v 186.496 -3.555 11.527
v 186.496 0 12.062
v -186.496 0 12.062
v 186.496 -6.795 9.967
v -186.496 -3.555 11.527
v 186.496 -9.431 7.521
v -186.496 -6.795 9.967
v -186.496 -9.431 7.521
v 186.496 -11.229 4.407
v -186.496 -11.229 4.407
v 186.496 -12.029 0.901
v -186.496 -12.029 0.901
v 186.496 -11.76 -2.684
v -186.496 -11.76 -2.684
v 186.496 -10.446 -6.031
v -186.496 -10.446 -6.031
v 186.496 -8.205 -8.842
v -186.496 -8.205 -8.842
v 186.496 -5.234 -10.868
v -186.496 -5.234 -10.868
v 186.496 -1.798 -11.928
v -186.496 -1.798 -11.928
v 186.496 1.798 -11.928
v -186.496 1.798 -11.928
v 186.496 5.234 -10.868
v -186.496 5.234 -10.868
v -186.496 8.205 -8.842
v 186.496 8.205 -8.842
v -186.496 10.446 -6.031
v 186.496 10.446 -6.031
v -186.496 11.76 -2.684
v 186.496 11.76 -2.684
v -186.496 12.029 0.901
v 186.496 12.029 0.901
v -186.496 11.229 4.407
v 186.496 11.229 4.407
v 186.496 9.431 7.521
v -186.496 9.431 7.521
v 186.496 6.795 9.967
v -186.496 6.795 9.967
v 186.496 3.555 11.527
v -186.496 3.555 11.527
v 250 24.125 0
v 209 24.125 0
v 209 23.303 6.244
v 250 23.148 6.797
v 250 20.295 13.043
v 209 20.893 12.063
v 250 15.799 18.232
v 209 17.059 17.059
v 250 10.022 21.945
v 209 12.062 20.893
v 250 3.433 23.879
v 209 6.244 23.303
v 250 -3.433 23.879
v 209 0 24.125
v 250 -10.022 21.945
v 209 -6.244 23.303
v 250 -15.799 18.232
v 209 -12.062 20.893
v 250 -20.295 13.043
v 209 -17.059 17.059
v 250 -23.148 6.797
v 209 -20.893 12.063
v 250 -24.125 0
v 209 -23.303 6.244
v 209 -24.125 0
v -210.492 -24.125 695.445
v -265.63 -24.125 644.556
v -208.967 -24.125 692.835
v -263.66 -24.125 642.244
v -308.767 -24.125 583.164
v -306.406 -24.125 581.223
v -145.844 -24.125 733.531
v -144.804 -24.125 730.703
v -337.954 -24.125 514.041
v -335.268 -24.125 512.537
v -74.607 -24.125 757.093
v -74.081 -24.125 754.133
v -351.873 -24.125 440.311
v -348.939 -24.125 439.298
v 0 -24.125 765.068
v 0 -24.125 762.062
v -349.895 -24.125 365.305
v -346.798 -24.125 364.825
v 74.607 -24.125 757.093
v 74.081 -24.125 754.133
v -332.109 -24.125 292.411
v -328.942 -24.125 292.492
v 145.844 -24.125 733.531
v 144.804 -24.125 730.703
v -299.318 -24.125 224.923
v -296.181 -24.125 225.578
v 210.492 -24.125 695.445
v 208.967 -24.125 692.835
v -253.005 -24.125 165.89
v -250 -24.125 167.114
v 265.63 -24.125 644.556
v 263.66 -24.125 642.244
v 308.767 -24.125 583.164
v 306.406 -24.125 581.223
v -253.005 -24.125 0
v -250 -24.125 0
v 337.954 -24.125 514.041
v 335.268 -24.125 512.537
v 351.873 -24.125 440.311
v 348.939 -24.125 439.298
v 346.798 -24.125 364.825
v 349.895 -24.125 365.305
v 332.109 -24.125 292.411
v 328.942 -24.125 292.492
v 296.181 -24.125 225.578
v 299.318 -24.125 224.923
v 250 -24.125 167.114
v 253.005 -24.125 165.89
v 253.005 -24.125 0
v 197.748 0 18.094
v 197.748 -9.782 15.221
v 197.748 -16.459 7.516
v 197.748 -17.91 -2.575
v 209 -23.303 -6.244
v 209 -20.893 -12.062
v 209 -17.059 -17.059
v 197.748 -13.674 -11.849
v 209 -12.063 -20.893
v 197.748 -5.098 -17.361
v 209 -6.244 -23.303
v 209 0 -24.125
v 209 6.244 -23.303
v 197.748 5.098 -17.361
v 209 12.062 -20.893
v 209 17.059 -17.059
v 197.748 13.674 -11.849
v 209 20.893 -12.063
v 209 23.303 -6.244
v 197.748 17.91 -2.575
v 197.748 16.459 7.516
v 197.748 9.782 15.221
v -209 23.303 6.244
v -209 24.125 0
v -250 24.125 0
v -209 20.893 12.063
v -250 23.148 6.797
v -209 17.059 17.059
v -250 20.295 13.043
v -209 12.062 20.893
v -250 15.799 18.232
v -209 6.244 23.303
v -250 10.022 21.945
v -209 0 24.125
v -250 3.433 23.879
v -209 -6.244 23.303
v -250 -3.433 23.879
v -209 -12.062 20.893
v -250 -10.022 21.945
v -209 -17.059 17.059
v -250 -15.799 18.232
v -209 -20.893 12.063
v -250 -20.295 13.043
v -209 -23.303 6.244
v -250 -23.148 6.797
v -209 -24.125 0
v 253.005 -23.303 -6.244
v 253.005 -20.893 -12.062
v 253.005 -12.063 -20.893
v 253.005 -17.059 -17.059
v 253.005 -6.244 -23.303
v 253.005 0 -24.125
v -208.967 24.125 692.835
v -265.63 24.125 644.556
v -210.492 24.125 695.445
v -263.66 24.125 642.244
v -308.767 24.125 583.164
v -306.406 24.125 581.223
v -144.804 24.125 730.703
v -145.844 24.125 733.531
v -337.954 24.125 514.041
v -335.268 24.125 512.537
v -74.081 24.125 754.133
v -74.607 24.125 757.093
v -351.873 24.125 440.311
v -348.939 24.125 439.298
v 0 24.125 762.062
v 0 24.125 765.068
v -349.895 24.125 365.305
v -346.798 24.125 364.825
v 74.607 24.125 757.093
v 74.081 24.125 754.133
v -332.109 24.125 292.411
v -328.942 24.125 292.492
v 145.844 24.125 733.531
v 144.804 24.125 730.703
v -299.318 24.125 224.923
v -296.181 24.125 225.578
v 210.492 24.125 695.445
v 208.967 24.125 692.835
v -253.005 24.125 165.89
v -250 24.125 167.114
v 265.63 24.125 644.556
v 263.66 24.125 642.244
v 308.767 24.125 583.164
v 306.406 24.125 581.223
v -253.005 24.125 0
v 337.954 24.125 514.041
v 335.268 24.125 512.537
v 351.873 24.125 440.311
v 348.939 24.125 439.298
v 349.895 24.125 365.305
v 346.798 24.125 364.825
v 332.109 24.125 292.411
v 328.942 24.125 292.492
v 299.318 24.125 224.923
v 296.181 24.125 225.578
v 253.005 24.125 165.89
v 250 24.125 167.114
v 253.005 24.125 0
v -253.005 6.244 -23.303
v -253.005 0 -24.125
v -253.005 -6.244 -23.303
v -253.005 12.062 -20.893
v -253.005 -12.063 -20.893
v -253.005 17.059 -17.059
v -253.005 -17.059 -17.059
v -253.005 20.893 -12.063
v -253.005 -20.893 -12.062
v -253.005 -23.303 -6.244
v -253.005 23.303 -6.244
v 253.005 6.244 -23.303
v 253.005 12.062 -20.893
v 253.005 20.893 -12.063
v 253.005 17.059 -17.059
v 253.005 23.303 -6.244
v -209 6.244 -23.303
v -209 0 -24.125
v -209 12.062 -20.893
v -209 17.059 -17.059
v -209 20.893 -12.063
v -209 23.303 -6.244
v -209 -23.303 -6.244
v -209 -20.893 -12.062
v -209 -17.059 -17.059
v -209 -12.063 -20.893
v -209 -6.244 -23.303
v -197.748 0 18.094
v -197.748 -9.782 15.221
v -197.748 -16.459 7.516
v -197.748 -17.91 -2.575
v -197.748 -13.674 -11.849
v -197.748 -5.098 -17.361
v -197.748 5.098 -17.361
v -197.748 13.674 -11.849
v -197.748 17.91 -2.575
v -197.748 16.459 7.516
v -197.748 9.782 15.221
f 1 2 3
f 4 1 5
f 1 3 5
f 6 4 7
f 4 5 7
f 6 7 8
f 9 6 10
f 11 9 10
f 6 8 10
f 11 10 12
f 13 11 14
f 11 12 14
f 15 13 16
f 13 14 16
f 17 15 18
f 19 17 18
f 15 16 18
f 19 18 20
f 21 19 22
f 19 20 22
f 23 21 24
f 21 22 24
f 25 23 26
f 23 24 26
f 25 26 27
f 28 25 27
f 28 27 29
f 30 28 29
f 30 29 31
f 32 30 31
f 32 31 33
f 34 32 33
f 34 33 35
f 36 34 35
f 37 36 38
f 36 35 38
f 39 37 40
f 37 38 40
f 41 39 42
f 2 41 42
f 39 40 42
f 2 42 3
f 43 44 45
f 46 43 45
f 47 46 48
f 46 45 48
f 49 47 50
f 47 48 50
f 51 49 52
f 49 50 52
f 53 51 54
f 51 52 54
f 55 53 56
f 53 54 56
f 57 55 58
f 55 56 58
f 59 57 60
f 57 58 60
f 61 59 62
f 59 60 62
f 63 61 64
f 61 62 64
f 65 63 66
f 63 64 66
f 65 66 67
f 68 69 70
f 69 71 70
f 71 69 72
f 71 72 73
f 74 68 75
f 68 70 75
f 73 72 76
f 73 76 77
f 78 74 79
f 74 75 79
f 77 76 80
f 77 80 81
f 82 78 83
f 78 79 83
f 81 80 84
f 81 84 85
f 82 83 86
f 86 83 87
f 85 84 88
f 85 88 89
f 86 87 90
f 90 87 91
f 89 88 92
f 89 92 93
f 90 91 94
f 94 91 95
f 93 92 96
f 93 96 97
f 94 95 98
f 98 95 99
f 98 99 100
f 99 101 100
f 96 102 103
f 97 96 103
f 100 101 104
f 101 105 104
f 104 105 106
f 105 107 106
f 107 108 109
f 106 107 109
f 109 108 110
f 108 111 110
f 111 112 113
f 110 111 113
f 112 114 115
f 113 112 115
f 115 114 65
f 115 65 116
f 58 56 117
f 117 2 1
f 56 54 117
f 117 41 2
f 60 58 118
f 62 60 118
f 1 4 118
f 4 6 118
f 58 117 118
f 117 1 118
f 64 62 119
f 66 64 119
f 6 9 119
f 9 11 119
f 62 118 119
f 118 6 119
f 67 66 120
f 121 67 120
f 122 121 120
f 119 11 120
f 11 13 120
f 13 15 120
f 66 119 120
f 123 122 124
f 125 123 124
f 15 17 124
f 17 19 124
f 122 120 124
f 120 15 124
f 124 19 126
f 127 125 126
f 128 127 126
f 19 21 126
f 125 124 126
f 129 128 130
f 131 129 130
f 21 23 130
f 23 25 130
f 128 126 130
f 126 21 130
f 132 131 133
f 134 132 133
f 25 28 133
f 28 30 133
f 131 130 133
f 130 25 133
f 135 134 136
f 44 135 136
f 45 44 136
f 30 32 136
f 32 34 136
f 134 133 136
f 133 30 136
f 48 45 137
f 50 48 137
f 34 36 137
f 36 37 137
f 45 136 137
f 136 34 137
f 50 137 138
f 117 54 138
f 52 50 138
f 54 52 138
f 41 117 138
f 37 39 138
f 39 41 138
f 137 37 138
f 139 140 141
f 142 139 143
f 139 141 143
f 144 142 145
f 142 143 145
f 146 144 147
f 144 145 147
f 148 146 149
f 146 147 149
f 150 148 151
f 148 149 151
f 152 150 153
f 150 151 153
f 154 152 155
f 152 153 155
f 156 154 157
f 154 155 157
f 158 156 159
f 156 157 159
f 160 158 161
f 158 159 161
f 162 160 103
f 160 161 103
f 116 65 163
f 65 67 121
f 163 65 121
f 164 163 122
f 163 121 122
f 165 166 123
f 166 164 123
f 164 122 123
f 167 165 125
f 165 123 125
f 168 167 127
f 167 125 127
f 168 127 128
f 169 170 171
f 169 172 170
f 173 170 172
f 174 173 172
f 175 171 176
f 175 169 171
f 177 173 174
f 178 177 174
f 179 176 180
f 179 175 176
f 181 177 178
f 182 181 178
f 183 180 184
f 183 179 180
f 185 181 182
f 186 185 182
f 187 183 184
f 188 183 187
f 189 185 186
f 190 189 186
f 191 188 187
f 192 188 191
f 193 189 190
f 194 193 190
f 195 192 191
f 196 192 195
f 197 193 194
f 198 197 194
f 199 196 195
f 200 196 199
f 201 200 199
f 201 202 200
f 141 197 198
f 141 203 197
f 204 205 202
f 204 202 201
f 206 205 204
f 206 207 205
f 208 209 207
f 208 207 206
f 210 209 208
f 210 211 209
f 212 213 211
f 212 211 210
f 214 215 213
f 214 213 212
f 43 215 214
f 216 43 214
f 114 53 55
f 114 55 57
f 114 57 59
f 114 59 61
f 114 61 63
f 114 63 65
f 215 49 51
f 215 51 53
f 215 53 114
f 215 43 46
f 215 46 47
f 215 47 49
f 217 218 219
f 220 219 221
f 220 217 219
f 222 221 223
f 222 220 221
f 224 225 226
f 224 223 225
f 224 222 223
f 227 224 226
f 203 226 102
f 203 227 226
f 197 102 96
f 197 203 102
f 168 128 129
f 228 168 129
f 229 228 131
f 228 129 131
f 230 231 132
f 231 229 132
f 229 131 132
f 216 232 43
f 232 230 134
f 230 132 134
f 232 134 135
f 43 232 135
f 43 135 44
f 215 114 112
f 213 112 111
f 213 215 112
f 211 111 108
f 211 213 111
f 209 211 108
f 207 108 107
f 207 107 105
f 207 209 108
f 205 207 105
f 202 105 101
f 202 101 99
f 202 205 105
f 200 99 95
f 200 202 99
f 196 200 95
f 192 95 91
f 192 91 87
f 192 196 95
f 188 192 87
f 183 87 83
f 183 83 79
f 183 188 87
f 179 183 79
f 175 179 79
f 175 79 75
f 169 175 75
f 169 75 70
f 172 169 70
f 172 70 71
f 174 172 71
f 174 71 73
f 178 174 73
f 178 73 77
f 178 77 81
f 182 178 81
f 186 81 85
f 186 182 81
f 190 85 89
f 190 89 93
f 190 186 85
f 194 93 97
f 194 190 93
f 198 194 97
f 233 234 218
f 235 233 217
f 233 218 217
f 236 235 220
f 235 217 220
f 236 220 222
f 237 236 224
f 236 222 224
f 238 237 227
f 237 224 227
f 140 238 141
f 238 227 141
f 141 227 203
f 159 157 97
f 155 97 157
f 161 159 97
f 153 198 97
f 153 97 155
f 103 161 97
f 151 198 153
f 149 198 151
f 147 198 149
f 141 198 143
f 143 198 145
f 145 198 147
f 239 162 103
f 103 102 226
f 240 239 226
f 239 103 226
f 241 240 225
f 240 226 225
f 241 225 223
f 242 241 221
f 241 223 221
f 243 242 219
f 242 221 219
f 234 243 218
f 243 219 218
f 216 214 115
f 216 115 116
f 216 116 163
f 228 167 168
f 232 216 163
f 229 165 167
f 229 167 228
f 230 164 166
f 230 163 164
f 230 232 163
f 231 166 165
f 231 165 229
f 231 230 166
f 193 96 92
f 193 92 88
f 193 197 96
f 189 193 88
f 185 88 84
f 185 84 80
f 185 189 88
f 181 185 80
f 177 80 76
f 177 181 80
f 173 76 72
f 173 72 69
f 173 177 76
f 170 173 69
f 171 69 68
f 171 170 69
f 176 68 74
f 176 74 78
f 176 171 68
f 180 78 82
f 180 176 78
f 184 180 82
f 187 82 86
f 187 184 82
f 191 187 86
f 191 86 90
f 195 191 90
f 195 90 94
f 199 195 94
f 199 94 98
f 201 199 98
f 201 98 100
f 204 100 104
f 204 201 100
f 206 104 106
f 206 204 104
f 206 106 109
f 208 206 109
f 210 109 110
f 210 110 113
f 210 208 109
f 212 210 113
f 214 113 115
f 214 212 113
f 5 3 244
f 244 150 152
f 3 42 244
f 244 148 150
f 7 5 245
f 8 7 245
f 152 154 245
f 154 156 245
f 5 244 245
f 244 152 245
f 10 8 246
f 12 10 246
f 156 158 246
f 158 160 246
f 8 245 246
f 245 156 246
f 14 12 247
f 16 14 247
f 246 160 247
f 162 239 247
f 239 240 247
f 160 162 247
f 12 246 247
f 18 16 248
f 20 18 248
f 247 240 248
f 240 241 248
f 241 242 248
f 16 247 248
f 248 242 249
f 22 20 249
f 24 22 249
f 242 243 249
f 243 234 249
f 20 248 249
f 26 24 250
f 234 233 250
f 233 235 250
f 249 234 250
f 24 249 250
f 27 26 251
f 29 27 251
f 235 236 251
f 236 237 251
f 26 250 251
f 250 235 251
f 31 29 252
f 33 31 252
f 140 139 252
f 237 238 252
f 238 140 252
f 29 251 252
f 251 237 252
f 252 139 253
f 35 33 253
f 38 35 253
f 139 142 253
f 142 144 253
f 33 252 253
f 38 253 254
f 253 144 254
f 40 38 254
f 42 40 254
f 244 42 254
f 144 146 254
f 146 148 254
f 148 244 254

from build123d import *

# Parameters (mm, degrees)
BOSS_EXTRUDE1_DEPTH = 24.125
CUT_EXTRUDE1_DEPTH  = 977.298322892


with BuildPart() as part:
    # Sketch1 → Revolve1 (revolve)
    with BuildSketch(Plane(origin=(0, 0, 0), x_dir=(1, 0, 0), z_dir=(0, 1, 0)), mode=Mode.PRIVATE) as revolve1_sk:
        Polygon((-250, 0), (250, 0), (250, 24.125), (209, 24.125), (186.495513174, 12.0625), (0, 12.0625), (-186.495513174, 12.0625), (-209, 24.125), (-250, 24.125), align=None)
    revolve(revolve1_sk.sketch.rotate(Axis((-250, 0, 0), (1, 0, 0)), 180), axis=Axis((-250, 0, 0), (1, 0, 0)))

    # Sketch3 → Boss-Extrude1 (add, symmetric)
    with BuildSketch(Plane(origin=(0, 0, 0), x_dir=(1, 0, 0), z_dir=(0, 1, 0))):
        with BuildLine():
            Line((-253.005, 0), (-253.005, -165.889796395))
            ThreePointArc((-253.005, -165.889796395), (0, -765.0675), (253.005, -165.889796395))
            Line((253.005, -165.889796395), (253.005, 0))
            Line((253.005, 0), (253.005, 24.125))
            Line((253.005, 24.125), (250, 24.125))
            Line((250, 24.125), (250, 0))
            Line((250, 0), (250, -167.113525722))
            ThreePointArc((250, -167.113525722), (0, -762.0625), (-250, -167.113525722))
            Line((-250, -167.113525722), (-250, 0))
            Line((-250, 0), (-250, 24.125))
            Line((-250, 24.125), (-253.005, 24.125))
            Line((-253.005, 24.125), (-253.005, 0))
        make_face()
    extrude(amount=BOSS_EXTRUDE1_DEPTH, both=True)

    # Sketch4 → Cut-Extrude1 (cut, through all)
    with BuildSketch(Plane.ZY.offset(253.005)):
        with BuildLine():
            ThreePointArc((-24.125, -2.4e-08), (-17.058951105, 17.058951087), (0, 24.125))
            Line((0, 24.125), (-24.125, 24.125))
            Line((-24.125, 24.125), (-24.125, -2.4e-08))
        make_face()
        with BuildLine():
            ThreePointArc((0, -24.125), (-17.058951087, -17.058951105), (-24.125, -2.4e-08))
            Line((-24.125, -2.4e-08), (-24.125, -24.125))
            Line((-24.125, -24.125), (0, -24.125))
        make_face()
    extrude(amount=-CUT_EXTRUDE1_DEPTH, mode=Mode.SUBTRACT)


solid = part.part
